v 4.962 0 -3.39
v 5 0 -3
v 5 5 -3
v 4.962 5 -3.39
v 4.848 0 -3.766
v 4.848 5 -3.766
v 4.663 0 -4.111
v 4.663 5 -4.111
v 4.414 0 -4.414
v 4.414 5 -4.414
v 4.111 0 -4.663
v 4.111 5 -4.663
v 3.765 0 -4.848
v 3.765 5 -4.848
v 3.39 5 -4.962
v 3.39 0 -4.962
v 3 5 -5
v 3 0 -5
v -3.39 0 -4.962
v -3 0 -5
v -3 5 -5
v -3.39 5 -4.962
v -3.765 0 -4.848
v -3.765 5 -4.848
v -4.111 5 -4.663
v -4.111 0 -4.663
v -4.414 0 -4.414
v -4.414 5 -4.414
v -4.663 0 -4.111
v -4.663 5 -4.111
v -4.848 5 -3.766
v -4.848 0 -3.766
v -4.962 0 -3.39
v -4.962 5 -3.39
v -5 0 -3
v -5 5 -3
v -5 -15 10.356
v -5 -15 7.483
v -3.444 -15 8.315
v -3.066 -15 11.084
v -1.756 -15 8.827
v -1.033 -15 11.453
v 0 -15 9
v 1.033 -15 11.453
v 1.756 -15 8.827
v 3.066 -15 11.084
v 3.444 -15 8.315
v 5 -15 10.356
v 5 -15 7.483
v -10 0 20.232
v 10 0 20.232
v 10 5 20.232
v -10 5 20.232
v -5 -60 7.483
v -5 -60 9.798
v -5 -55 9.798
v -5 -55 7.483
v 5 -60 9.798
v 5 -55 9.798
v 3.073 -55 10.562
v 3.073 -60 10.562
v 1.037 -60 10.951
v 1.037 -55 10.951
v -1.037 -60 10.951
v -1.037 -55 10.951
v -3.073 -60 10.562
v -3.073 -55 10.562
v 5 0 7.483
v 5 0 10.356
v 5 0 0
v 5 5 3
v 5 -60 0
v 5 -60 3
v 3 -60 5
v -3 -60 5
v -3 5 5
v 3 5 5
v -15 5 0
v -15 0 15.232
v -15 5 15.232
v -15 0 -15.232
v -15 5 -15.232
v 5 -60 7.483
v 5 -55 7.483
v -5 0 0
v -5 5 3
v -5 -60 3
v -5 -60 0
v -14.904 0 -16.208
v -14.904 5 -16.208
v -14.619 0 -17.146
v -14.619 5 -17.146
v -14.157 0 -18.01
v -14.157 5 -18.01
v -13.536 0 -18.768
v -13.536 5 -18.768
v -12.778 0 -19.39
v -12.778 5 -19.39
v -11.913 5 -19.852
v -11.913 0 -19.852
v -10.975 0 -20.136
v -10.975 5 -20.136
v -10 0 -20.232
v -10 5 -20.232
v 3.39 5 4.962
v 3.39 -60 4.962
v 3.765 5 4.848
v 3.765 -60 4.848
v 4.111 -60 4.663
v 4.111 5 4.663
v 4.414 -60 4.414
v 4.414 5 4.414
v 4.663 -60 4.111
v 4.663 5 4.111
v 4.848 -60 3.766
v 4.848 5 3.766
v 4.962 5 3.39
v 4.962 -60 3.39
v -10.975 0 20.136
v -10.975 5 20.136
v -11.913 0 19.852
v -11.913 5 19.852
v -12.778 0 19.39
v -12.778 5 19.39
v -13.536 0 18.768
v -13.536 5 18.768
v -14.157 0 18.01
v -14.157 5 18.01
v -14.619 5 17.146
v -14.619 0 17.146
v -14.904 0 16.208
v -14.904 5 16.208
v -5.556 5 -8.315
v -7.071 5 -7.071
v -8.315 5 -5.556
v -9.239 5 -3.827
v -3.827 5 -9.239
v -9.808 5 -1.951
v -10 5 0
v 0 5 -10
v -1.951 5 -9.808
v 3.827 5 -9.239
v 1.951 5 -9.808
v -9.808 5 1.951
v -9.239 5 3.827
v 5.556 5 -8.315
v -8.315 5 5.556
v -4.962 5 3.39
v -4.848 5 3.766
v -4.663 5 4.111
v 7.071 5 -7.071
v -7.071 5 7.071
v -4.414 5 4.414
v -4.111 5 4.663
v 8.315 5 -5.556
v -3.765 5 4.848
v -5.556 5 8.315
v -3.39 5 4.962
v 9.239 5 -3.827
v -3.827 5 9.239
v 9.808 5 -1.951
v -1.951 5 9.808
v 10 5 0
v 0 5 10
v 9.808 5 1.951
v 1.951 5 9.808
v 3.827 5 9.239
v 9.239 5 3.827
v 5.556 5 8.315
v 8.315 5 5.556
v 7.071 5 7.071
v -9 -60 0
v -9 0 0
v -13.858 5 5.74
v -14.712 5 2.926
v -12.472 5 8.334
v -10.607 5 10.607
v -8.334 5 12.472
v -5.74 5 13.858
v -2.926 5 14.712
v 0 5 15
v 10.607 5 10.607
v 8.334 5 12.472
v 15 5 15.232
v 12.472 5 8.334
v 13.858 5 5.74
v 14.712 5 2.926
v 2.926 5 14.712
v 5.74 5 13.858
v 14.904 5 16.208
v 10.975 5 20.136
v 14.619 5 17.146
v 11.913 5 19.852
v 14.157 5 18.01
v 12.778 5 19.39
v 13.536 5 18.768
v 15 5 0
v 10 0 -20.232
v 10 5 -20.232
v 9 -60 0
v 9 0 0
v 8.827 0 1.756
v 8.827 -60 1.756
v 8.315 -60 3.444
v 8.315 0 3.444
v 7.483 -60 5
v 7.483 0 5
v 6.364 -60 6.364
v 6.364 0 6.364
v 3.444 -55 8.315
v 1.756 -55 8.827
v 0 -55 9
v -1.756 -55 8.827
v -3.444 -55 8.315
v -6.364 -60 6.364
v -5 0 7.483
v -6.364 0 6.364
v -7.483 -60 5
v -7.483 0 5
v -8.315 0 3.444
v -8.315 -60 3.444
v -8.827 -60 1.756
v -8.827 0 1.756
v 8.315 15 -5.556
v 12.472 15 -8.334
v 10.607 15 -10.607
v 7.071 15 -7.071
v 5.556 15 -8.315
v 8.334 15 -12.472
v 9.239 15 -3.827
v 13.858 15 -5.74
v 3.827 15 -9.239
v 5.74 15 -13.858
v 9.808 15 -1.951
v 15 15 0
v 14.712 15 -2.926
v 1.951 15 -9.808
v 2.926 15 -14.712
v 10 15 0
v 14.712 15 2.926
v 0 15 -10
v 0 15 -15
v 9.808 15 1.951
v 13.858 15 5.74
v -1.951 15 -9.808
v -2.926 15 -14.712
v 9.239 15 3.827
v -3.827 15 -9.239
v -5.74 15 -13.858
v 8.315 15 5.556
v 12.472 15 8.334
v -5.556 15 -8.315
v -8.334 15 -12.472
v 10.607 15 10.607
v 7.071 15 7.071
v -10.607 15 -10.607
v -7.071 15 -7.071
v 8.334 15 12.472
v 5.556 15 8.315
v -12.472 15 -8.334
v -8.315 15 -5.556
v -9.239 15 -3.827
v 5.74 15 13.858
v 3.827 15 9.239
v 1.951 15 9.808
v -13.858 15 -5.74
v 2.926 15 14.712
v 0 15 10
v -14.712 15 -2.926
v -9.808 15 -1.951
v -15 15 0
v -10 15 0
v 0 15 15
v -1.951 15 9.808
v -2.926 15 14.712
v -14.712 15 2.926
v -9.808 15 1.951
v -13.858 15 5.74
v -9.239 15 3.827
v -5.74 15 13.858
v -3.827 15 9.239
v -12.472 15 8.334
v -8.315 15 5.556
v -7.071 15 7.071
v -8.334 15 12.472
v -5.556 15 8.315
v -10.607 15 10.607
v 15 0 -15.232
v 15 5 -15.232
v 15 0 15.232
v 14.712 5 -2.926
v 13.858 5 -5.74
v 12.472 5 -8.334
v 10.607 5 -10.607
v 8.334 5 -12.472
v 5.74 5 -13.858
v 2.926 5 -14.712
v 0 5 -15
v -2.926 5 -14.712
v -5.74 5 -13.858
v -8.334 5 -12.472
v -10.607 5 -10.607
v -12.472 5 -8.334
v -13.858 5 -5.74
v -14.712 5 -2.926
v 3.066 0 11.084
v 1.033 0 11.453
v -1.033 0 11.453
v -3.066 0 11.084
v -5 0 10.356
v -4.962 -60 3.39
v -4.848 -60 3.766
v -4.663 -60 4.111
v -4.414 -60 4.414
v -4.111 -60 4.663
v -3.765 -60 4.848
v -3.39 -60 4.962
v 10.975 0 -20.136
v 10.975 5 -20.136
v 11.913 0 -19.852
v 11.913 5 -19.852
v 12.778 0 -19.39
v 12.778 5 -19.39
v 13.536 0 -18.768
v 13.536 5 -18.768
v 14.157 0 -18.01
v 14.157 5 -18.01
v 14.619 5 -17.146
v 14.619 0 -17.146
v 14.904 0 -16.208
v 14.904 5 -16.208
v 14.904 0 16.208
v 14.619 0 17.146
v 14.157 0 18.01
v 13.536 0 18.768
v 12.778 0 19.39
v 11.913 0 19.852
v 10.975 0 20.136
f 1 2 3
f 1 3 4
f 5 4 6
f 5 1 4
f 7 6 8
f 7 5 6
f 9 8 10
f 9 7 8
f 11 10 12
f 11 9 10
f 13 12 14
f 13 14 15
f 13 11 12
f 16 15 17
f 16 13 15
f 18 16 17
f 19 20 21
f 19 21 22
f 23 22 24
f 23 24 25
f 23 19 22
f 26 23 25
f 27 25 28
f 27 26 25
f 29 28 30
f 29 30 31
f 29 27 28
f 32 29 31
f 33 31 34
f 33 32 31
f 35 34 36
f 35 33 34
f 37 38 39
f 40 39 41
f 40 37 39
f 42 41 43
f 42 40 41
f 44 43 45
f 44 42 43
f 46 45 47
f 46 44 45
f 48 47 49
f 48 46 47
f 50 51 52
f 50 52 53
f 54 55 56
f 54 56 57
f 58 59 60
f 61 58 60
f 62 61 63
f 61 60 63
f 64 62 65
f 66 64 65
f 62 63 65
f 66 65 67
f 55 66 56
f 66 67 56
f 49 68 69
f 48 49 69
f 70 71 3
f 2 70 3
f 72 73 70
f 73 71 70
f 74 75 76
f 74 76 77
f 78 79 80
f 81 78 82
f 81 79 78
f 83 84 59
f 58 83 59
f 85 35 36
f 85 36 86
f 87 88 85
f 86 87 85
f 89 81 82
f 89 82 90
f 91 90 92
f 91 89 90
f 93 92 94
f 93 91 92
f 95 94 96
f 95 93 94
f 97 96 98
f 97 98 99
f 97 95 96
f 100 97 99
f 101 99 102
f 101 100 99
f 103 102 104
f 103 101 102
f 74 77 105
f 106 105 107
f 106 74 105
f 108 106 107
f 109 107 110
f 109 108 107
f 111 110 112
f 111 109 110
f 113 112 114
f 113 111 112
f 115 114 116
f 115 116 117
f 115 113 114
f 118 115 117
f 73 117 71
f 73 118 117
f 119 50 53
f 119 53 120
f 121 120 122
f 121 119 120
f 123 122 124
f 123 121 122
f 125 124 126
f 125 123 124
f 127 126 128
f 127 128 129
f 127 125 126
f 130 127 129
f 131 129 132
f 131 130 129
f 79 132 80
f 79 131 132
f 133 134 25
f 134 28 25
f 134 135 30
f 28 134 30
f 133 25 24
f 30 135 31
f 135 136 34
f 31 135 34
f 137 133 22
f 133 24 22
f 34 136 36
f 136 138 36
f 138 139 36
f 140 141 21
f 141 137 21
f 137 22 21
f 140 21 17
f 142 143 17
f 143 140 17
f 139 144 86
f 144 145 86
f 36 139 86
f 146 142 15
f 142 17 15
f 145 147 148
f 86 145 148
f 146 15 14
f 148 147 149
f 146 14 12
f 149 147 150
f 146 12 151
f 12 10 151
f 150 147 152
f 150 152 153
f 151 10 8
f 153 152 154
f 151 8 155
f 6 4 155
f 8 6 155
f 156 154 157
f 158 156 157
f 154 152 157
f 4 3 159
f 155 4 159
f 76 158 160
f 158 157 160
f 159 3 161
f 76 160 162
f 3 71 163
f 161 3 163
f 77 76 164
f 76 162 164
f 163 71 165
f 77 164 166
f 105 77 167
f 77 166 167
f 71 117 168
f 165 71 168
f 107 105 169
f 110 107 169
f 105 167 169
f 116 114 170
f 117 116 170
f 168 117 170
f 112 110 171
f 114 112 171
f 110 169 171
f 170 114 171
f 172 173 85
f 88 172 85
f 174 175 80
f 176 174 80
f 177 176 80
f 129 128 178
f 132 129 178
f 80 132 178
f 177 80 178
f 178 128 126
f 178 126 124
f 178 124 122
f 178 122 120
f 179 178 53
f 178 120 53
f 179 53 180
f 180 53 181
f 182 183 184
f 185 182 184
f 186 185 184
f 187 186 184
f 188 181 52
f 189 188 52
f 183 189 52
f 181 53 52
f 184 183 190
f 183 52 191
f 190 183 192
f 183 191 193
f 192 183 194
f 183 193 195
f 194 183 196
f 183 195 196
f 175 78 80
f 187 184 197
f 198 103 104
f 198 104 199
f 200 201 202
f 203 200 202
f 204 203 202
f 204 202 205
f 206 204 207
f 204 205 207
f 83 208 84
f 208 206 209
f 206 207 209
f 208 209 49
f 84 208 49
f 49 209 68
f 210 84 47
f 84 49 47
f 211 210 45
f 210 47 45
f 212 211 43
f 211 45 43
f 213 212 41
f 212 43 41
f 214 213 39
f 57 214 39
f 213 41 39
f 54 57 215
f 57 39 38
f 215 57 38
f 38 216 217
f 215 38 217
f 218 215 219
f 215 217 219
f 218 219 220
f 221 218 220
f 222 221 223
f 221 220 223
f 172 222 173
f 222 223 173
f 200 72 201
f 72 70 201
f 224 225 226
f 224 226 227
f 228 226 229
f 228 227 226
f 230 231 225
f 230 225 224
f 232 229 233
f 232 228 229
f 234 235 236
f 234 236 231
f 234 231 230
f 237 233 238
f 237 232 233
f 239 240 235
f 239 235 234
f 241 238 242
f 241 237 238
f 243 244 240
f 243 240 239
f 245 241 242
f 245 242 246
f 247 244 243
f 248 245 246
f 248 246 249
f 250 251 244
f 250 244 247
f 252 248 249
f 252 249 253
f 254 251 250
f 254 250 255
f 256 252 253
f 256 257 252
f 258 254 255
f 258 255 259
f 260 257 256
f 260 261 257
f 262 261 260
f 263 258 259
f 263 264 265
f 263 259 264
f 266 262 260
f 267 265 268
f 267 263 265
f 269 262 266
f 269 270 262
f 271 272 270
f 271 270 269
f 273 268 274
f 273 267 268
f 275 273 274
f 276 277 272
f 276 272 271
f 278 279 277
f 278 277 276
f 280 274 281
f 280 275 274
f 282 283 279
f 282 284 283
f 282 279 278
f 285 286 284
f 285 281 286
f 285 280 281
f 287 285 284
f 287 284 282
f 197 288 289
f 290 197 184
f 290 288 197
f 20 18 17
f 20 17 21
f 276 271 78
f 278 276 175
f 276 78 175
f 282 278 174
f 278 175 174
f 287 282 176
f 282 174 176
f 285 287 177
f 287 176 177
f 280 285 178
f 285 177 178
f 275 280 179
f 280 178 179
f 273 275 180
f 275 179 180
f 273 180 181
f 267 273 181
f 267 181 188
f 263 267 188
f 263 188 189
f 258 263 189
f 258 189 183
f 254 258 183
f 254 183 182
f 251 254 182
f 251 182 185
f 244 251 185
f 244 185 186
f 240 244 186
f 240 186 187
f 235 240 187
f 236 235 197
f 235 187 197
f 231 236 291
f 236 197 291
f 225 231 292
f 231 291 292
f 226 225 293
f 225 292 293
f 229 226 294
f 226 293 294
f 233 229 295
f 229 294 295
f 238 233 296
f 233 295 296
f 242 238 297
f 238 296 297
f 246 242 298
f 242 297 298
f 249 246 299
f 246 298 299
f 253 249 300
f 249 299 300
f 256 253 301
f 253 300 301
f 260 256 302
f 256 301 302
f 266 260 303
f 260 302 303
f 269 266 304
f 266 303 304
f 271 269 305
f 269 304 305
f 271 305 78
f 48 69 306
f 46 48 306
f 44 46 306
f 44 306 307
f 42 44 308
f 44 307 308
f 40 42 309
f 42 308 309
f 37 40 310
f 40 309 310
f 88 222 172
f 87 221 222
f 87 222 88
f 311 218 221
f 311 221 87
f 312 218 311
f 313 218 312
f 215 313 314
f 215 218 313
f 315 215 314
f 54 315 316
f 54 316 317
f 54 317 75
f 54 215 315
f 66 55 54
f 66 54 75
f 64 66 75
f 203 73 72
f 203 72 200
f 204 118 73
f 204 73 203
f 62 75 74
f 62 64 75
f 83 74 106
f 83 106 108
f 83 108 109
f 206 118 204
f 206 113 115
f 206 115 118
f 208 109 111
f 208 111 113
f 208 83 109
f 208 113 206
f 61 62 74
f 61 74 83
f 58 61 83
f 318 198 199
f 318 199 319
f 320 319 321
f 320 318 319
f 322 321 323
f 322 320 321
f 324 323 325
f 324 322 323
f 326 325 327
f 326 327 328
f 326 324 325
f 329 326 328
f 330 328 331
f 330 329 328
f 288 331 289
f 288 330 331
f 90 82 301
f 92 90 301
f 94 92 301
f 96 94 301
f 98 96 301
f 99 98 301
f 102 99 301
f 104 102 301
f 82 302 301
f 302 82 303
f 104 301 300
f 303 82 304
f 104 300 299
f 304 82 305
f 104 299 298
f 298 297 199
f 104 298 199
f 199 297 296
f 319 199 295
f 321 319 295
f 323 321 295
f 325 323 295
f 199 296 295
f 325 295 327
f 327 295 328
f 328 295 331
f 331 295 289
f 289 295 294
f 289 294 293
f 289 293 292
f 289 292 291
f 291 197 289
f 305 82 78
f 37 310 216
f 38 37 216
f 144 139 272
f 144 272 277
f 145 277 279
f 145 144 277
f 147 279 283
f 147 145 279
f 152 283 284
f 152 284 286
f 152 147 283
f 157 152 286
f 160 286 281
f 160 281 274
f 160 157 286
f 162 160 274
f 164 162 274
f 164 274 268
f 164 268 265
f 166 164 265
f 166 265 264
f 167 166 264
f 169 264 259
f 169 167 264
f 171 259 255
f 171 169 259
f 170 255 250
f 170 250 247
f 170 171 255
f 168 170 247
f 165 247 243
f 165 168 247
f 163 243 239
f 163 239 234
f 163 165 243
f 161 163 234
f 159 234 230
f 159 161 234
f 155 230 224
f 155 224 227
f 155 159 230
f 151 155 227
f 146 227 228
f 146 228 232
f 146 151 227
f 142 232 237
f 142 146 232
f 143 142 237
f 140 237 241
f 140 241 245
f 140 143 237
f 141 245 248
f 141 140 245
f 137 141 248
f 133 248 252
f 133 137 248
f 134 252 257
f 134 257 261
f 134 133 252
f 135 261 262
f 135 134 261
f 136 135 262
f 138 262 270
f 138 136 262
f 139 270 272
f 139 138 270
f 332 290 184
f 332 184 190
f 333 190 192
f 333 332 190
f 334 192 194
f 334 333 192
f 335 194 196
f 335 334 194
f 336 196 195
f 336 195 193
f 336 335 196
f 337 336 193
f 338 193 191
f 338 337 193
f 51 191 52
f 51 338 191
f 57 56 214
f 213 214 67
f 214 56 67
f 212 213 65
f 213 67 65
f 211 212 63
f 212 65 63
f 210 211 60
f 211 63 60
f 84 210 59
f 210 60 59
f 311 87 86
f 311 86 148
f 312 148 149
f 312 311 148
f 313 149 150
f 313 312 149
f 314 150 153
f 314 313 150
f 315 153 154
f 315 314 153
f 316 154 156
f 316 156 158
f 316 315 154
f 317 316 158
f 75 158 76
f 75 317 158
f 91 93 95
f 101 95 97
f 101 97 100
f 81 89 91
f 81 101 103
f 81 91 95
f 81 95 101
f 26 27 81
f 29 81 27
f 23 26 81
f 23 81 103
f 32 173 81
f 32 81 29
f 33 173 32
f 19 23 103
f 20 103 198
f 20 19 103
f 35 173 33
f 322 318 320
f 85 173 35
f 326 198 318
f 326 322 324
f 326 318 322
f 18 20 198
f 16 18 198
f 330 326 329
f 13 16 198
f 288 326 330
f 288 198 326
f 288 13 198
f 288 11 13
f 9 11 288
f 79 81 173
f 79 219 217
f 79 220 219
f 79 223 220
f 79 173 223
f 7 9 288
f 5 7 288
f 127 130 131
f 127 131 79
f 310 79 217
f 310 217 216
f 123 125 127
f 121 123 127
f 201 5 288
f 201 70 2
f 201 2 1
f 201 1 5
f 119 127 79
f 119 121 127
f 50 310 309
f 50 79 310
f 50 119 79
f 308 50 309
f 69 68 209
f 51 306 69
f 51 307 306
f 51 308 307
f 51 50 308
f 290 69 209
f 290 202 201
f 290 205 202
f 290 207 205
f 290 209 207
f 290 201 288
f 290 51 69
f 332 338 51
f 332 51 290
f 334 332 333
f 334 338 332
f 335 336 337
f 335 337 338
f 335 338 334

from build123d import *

# Parameters (mm, degrees)
F1_DEPTH = 55
F3_DEPTH = 5
F4_DEPTH = 5
F5_R     = 10
F6_DEPTH = 10
F7_DEPTH = 15


with BuildPart() as f1:
    # F0 (on Front) → F1 (new body)
    with BuildSketch(Plane.XZ):
        with BuildLine():
            Line((5, 0), (9, 0))
            ThreePointArc((9, 0), (7.9372539332, 4.2426406871), (5, 7.4833147735))
            Line((5, 7.4833147735), (5, 3.0001575886))
            Line((5, 3.0001575886), (5, 0))
        make_face()
        with BuildLine():
            Line((5, 3.0001575886), (5, 7.4833147735))
            ThreePointArc((5, 7.4833147735), (0, 9), (-5, 7.4833147735))
            Line((-5, 7.4833147735), (-5, 3.0001575886))
            ThreePointArc((-5, 3.0001575886), (-4.4142135624, 4.414371151), (-3, 5.0001575886))
            Line((-3, 5.0001575886), (3, 5.0001575886))
            ThreePointArc((3, 5.0001575886), (4.4142135624, 4.414371151), (5, 3.0001575886))
        make_face()
        with BuildLine():
            Line((-5, 3.0001575886), (-5, 7.4833147735))
            ThreePointArc((-5, 7.4833147735), (-7.9372539332, 4.2426406871), (-9, 0))
            Line((-9, 0), (-5, 0))
            Line((-5, 0), (-5, 3.0001575886))
        make_face()
    extrude(amount=F1_DEPTH)

    # F2 (on face) → F3 (join)
    with BuildSketch(Plane.XZ.offset(55)):
        with BuildLine():
            Line((-5, 0), (-5, 3.0001575886))
            Line((-5, 3.0001575886), (-5, 7.4833147735))
            ThreePointArc((-5, 7.4833147735), (-7.9372539332, 4.2426406871), (-9, 0))
            Line((-9, 0), (-5, 0))
        make_face()
        with BuildLine():
            Line((-5, 7.4833147735), (-5, 3.0001575886))
            ThreePointArc((-5, 3.0001575886), (-4.4142135624, 4.414371151), (-3, 5.0001575886))
            Line((-3, 5.0001575886), (3, 5.0001575886))
            ThreePointArc((3, 5.0001575886), (4.4142135624, 4.414371151), (5, 3.0001575886))
            Line((5, 3.0001575886), (5, 7.4833147735))
            ThreePointArc((5, 7.4833147735), (0, 9), (-5, 7.4833147735))
        make_face()
        with BuildLine():
            Line((-5, 9.7981165597), (-5, 7.4833147735))
            ThreePointArc((-5, 7.4833147735), (0, 9), (5, 7.4833147735))
            Line((5, 7.4833147735), (5, 9.7981165597))
            ThreePointArc((5, 9.7981165597), (0, 11.0001403681), (-5, 9.7981165597))
        make_face()
        with BuildLine():
            Line((5, 7.4833147735), (5, 3.0001575886))
            Line((5, 3.0001575886), (5, 0))
            Line((5, 0), (9, 0))
            ThreePointArc((9, 0), (7.9372539332, 4.2426406871), (5, 7.4833147735))
        make_face()
    extrude(amount=F3_DEPTH)



with BuildPart() as f4:
    # F0 (on Front) → F4 (new body)
    with BuildSketch(Plane.XZ):
        with BuildLine():
            Line((-10, -20.2321839634), (10, -20.2321839634))
            ThreePointArc((10, -20.2321839634), (13.5355339059, -18.7677178693), (15, -15.2321839634))
            Line((15, -15.2321839634), (15, 15.2321839634))
            ThreePointArc((15, 15.2321839634), (13.5355339059, 18.7677178693), (10, 20.2321839634))
            Line((10, 20.2321839634), (-10, 20.2321839634))
            ThreePointArc((-10, 20.2321839634), (-13.5355339059, 18.7677178693), (-15, 15.2321839634))
            Line((-15, 15.2321839634), (-15, -15.2321839634))
            ThreePointArc((-15, -15.2321839634), (-13.5355339059, -18.7677178693), (-10, -20.2321839634))
        make_face()
        with BuildLine():
            ThreePointArc((5, 7.4833147735), (7.9372539332, 4.2426406871), (9, 0))
            Line((9, 0), (5, 0))
            Line((5, 0), (5, -3.0001575886))
            ThreePointArc((5, -3.0001575886), (4.4142135624, -4.414371151), (3, -5.0001575886))
            Line((3, -5.0001575886), (-3, -5.0001575886))
            ThreePointArc((-3, -5.0001575886), (-4.4142135624, -4.414371151), (-5, -3.0001575886))
            Line((-5, -3.0001575886), (-5, 0))
            Line((-5, 0), (-9, 0))
            ThreePointArc((-9, 0), (-7.9372539332, 4.2426406871), (-5, 7.4833147735))
            Line((-5, 7.4833147735), (-5, 10.3561575886))
            ThreePointArc((-5, 10.3561575886), (0, 11.5), (5, 10.3561575886))
            Line((5, 10.3561575886), (5, 7.4833147735))
        make_face(mode=Mode.SUBTRACT)
        with BuildLine():
            Line((5, 0), (9, 0))
            ThreePointArc((9, 0), (7.9372539332, 4.2426406871), (5, 7.4833147735))
            Line((5, 7.4833147735), (5, 3.0001575886))
            Line((5, 3.0001575886), (5, 0))
        make_face()
        with BuildLine():
            Line((5, 3.0001575886), (5, 7.4833147735))
            ThreePointArc((5, 7.4833147735), (0, 9), (-5, 7.4833147735))
            Line((-5, 7.4833147735), (-5, 3.0001575886))
            ThreePointArc((-5, 3.0001575886), (-4.4142135624, 4.414371151), (-3, 5.0001575886))
            Line((-3, 5.0001575886), (3, 5.0001575886))
            ThreePointArc((3, 5.0001575886), (4.4142135624, 4.414371151), (5, 3.0001575886))
        make_face()
        with BuildLine():
            Line((-5, 3.0001575886), (-5, 7.4833147735))
            ThreePointArc((-5, 7.4833147735), (-7.9372539332, 4.2426406871), (-9, 0))
            Line((-9, 0), (-5, 0))
            Line((-5, 0), (-5, 3.0001575886))
        make_face()
        with BuildLine():
            ThreePointArc((-5, 7.4833147735), (0, 9), (5, 7.4833147735))
            Line((5, 7.4833147735), (5, 10.3561575886))
            ThreePointArc((5, 10.3561575886), (0, 11.5), (-5, 10.3561575886))
            Line((-5, 10.3561575886), (-5, 7.4833147735))
        make_face()
    extrude(amount=-F4_DEPTH)

    # F5 (on face) → F6 (join)
    with BuildSketch(Plane(origin=(0, 5, 0), x_dir=(-1, 0, 0), z_dir=(0, 1, 0))):
        with BuildLine():
            ThreePointArc((-15, 3.9e-09), (-1.9e-09, -15), (15, 0))
            ThreePointArc((15, 0), (1.9e-09, 15), (-15, 3.9e-09))
        make_face()
        Circle(F5_R, mode=Mode.SUBTRACT)
    extrude(amount=F6_DEPTH)


with BuildPart() as f1_1:
    add(f1.part)

    add(f4.part)  # F7 merges F4
    # F0 (on Front) → F7 (join)
    with BuildSketch(Plane.XZ):
        with BuildLine():
            ThreePointArc((-5, 7.4833147735), (0, 9), (5, 7.4833147735))
            Line((5, 7.4833147735), (5, 10.3561575886))
            ThreePointArc((5, 10.3561575886), (0, 11.5), (-5, 10.3561575886))
            Line((-5, 10.3561575886), (-5, 7.4833147735))
        make_face()
    extrude(amount=F7_DEPTH)


solid = f1_1.part
